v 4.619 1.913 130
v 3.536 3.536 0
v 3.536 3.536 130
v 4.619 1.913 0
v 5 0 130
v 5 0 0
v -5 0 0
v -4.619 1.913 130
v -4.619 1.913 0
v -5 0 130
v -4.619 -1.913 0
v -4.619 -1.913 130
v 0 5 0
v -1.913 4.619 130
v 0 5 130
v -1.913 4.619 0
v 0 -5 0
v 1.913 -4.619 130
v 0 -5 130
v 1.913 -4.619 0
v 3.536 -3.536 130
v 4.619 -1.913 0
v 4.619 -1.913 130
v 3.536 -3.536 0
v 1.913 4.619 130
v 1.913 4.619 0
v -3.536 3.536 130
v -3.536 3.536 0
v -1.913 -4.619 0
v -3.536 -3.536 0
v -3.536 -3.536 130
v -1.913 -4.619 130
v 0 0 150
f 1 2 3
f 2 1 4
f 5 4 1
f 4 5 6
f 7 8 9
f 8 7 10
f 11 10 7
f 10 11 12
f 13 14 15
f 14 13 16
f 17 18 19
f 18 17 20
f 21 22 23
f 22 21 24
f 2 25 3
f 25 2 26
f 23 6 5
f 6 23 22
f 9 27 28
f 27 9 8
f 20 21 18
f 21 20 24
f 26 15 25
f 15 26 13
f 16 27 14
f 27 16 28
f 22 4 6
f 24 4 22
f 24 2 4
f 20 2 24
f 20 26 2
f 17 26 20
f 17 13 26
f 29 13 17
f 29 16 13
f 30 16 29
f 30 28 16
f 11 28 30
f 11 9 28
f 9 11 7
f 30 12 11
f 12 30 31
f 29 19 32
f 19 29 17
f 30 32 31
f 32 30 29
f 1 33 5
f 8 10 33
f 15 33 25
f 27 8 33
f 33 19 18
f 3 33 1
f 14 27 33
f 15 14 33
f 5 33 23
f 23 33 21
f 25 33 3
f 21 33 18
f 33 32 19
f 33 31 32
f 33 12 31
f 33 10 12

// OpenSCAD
// Plantilla paramétrica de un lápiz
module pencil(length = 150, radius = 5, tip_length = 20) {
    // Cuerpo del lápiz
    cylinder(h = length - tip_length, r = radius, center = false);

    // Punta del lápiz
    translate([0, 0, length - tip_length])
        cone(h = tip_length, r1 = radius, r2 = 0);
}

// Módulo para un cono
module cone(h, r1, r2) {
    cylinder(h = h, r1 = r1, r2 = r2, center = false);
}

// Llamada al módulo del lápiz
pencil();
